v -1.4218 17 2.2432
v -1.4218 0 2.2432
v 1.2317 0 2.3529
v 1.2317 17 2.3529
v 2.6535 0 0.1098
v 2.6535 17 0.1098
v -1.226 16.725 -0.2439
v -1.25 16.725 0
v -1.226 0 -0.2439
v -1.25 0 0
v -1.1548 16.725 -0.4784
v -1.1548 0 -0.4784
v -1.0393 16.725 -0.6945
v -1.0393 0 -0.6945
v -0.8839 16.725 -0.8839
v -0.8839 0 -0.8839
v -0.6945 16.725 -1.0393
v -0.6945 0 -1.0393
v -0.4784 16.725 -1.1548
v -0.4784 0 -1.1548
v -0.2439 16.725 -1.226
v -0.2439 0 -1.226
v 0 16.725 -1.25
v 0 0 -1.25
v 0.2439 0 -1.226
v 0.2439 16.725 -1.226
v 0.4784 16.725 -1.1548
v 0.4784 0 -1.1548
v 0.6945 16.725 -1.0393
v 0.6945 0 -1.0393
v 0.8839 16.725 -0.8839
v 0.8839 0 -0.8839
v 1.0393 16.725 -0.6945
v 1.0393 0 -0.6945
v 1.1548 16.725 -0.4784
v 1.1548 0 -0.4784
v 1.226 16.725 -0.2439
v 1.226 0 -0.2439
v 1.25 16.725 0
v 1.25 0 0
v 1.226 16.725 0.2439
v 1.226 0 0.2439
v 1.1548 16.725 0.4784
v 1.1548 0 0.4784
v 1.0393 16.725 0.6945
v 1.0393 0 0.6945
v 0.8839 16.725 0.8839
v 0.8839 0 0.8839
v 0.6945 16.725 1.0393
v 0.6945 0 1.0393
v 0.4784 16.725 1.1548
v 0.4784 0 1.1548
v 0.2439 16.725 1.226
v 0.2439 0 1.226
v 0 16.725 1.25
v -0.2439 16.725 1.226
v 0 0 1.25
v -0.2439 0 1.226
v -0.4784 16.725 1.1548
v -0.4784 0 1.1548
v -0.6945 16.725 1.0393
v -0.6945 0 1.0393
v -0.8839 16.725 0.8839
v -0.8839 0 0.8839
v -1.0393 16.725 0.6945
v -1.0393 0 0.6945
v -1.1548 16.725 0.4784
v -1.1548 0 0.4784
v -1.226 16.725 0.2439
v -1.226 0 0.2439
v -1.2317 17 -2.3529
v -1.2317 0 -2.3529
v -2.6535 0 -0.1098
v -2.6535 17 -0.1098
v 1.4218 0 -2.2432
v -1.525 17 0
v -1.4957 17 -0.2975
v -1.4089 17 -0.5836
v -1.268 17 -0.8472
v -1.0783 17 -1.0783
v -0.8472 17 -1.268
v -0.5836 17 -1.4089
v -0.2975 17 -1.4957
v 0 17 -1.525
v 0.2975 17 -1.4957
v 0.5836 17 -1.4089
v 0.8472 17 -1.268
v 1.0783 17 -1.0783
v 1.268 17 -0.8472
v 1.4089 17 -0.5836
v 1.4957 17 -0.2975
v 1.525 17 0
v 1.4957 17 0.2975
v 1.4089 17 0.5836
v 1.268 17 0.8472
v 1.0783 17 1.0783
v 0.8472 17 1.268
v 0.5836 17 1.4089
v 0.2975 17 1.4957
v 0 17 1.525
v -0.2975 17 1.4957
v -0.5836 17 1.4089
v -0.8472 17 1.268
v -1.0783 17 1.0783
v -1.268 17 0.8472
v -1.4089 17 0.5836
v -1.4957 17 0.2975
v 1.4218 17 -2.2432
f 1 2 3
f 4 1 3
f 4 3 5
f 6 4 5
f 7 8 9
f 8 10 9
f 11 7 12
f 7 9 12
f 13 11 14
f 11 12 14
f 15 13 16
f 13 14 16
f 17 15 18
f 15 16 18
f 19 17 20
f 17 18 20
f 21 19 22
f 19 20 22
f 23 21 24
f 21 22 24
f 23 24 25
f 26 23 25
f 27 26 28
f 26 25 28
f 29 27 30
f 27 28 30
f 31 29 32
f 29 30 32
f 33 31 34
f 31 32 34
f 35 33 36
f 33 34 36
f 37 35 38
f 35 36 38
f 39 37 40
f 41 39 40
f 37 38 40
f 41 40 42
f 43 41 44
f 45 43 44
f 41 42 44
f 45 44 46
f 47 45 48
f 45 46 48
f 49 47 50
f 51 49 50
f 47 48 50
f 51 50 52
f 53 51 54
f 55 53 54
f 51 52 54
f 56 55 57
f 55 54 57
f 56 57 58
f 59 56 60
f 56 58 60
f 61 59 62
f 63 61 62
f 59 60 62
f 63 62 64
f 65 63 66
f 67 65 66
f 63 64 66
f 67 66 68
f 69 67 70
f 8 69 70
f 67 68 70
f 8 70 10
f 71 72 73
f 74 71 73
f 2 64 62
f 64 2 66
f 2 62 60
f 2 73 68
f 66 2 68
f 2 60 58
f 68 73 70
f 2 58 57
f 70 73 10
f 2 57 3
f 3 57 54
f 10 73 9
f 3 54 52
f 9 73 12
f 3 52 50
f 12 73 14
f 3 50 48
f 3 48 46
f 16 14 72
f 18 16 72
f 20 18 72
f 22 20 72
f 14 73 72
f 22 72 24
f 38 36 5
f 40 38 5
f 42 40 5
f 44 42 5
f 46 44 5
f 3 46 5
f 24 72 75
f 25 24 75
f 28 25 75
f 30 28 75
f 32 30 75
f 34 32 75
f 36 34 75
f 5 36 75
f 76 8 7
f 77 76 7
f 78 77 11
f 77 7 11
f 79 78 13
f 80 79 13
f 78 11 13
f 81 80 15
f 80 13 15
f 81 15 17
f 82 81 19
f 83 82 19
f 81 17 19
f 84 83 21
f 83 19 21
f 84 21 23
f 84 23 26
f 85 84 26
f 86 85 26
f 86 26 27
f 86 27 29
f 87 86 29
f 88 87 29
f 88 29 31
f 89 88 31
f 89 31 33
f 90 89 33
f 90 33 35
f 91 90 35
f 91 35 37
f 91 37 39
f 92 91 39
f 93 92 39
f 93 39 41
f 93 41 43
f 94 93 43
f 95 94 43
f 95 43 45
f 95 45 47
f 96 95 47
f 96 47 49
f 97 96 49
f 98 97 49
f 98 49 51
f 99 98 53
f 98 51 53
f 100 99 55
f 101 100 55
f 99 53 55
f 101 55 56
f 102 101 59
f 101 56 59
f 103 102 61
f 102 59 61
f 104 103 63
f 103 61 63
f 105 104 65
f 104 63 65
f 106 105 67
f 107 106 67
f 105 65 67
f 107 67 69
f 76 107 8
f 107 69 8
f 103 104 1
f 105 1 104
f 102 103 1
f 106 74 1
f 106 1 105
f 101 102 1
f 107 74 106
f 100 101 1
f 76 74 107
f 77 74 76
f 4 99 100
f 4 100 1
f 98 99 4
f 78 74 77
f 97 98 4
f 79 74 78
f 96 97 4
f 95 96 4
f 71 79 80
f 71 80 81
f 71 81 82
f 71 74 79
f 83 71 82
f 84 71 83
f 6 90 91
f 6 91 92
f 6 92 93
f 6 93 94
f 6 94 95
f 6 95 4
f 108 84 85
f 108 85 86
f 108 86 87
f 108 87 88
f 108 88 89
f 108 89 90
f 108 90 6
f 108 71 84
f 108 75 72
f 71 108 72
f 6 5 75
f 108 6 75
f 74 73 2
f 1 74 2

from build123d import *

# Parameters (mm, degrees)
SKETCH_1_R                   = 1.1
EXTRUDE_1_DEPTH              = 17
HOLE_WIZARD_M3_2_D           = 2.5
HOLE_WIZARD_M3_2_CSINK_D     = 3.05
HOLE_WIZARD_M3_2_CSINK_ANGLE = 90


with BuildPart() as part:
    # 草图1 → 凸台-拉伸1 (new body)
    with BuildSketch(Plane(origin=(0, 0, 0), x_dir=(1, 0, 0), z_dir=(0, 1, 0))):
        Polygon((1.231724884, -2.352910356), (2.653542583, -0.109750138), (1.421817699, 2.243160218), (-1.231724884, 2.352910356), (-2.653542583, 0.109750138), (-1.421817699, -2.243160218), align=None)
        Circle(SKETCH_1_R, mode=Mode.SUBTRACT)
    extrude(amount=EXTRUDE_1_DEPTH)

    # M3 螺纹孔2 (through all)
    with Locations(Plane(origin=(0, 17, 0), x_dir=(1, 0, 0), z_dir=(0, 1, 0))):
        with Locations((0, 0)):
            CounterSinkHole(HOLE_WIZARD_M3_2_D / 2, HOLE_WIZARD_M3_2_CSINK_D / 2, counter_sink_angle=HOLE_WIZARD_M3_2_CSINK_ANGLE)


solid = part.part
